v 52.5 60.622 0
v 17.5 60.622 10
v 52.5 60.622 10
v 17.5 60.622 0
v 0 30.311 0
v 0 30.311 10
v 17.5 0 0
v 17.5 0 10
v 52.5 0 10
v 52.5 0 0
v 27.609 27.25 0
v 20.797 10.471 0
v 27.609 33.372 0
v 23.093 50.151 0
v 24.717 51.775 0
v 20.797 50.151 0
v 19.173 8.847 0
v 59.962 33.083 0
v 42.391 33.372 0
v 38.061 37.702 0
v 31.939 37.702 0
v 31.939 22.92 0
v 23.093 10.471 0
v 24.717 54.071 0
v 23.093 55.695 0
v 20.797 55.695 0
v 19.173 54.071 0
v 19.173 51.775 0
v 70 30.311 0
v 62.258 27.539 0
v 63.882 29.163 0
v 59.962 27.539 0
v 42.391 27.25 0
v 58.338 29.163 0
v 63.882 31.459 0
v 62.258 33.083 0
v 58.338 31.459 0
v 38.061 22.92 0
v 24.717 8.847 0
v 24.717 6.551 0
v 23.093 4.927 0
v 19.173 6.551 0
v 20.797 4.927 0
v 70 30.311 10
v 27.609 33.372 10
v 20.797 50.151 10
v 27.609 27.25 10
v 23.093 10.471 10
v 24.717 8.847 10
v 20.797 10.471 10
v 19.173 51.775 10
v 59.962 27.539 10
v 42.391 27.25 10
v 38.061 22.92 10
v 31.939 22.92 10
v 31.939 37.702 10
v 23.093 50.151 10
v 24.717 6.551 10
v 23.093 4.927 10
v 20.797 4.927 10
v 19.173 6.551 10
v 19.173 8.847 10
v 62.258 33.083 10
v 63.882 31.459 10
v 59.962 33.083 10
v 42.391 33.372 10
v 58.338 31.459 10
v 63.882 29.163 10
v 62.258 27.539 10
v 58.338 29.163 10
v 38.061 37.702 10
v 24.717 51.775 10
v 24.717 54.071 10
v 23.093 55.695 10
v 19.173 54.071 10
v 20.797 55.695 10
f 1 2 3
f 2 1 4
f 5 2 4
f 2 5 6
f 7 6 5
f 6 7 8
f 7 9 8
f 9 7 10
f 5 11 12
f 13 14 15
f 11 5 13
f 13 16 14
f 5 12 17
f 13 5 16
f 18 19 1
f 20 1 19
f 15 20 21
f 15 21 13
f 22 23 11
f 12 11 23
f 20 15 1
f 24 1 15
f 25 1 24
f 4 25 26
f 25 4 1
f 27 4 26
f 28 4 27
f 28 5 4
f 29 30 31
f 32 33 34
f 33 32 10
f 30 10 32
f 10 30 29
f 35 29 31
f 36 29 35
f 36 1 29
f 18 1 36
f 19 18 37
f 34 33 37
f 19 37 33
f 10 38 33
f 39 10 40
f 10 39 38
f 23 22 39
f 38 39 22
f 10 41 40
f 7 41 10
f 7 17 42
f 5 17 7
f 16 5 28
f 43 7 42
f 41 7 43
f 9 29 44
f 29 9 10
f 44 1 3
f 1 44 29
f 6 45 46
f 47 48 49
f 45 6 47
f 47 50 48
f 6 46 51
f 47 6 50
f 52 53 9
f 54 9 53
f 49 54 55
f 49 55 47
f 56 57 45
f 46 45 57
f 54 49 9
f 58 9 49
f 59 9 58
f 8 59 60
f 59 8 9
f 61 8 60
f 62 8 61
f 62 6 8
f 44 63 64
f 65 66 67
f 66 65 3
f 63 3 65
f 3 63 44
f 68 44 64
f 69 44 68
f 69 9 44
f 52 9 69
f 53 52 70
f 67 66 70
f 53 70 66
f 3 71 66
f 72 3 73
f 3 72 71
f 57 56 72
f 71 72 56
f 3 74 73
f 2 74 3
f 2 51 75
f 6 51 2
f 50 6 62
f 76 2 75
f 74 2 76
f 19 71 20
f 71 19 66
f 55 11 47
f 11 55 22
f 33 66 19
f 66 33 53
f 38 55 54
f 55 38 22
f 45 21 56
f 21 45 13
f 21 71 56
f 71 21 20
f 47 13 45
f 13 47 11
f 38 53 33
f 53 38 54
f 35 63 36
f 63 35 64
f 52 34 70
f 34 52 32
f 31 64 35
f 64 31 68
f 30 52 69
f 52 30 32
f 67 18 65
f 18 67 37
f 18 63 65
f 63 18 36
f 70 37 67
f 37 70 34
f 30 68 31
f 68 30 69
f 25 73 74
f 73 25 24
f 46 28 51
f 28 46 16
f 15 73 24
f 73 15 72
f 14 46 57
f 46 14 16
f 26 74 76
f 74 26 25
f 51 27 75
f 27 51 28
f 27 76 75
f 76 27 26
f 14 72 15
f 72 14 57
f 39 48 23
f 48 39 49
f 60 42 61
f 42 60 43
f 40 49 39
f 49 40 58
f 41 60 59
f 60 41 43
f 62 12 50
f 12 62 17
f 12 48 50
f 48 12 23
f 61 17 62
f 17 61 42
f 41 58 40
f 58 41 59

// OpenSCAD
$fn = 32;

// ----------------------------------------------------------------------
// Polygon plate: 6-gon R35, 3 bolt windows
// ----------------------------------------------------------------------

// --- parameters (mm) ---
sides = 6;                // number of polygon sides
plate_r = 35;             // circumscribed radius of the polygon
bore_r = 8;               // centre bore radius
bolts = 3;                // number of bolt windows
ring_r = 26.11;           // bolt-circle radius
bolt_r = 3;               // bolt window radius
plate_t = 10;             // plate thickness, Z (extrusion height)

plate_d = 2 * plate_r;  // circumscribed diameter
bore_d = 2 * bore_r;  // centre bore diameter
bolt_d = 2 * bolt_r;  // bolt window diameter
ring_d = 2 * ring_r;  // bolt-circle diameter

profile = [[70, 30.311], [52.5, 60.622], [17.5, 60.622], [0, 30.311], [17.5, 0], [52.5, 0]];  // primary outline, 6 points, counter clockwise
void_1 = [[42.391, 33.372], [38.061, 37.702], [31.939, 37.702], [27.609, 33.372], [27.609, 27.25], [31.939, 22.92], [38.061, 22.92], [42.391, 27.25]];  // centre bore, 8 points
void_2 = [[63.882, 31.459], [62.258, 33.083], [59.962, 33.083], [58.338, 31.459], [58.338, 29.163], [59.962, 27.539], [62.258, 27.539], [63.882, 29.163]];  // bolt window 1, 8 points
void_3 = [[24.717, 54.071], [23.093, 55.695], [20.797, 55.695], [19.173, 54.071], [19.173, 51.775], [20.797, 50.151], [23.093, 50.151], [24.717, 51.775]];  // bolt window 2, 8 points
void_4 = [[24.717, 8.847], [23.093, 10.471], [20.797, 10.471], [19.173, 8.847], [19.173, 6.551], [20.797, 4.927], [23.093, 4.927], [24.717, 6.551]];  // bolt window 3, 8 points

// --- the one profile operation ---
difference() {
  linear_extrude(height = plate_t) polygon(points = profile);
  translate([0, 0, -1])
    linear_extrude(height = plate_t + 2) polygon(points = void_1);
  translate([0, 0, -1])
    linear_extrude(height = plate_t + 2) polygon(points = void_2);
  translate([0, 0, -1])
    linear_extrude(height = plate_t + 2) polygon(points = void_3);
  translate([0, 0, -1])
    linear_extrude(height = plate_t + 2) polygon(points = void_4);
}
